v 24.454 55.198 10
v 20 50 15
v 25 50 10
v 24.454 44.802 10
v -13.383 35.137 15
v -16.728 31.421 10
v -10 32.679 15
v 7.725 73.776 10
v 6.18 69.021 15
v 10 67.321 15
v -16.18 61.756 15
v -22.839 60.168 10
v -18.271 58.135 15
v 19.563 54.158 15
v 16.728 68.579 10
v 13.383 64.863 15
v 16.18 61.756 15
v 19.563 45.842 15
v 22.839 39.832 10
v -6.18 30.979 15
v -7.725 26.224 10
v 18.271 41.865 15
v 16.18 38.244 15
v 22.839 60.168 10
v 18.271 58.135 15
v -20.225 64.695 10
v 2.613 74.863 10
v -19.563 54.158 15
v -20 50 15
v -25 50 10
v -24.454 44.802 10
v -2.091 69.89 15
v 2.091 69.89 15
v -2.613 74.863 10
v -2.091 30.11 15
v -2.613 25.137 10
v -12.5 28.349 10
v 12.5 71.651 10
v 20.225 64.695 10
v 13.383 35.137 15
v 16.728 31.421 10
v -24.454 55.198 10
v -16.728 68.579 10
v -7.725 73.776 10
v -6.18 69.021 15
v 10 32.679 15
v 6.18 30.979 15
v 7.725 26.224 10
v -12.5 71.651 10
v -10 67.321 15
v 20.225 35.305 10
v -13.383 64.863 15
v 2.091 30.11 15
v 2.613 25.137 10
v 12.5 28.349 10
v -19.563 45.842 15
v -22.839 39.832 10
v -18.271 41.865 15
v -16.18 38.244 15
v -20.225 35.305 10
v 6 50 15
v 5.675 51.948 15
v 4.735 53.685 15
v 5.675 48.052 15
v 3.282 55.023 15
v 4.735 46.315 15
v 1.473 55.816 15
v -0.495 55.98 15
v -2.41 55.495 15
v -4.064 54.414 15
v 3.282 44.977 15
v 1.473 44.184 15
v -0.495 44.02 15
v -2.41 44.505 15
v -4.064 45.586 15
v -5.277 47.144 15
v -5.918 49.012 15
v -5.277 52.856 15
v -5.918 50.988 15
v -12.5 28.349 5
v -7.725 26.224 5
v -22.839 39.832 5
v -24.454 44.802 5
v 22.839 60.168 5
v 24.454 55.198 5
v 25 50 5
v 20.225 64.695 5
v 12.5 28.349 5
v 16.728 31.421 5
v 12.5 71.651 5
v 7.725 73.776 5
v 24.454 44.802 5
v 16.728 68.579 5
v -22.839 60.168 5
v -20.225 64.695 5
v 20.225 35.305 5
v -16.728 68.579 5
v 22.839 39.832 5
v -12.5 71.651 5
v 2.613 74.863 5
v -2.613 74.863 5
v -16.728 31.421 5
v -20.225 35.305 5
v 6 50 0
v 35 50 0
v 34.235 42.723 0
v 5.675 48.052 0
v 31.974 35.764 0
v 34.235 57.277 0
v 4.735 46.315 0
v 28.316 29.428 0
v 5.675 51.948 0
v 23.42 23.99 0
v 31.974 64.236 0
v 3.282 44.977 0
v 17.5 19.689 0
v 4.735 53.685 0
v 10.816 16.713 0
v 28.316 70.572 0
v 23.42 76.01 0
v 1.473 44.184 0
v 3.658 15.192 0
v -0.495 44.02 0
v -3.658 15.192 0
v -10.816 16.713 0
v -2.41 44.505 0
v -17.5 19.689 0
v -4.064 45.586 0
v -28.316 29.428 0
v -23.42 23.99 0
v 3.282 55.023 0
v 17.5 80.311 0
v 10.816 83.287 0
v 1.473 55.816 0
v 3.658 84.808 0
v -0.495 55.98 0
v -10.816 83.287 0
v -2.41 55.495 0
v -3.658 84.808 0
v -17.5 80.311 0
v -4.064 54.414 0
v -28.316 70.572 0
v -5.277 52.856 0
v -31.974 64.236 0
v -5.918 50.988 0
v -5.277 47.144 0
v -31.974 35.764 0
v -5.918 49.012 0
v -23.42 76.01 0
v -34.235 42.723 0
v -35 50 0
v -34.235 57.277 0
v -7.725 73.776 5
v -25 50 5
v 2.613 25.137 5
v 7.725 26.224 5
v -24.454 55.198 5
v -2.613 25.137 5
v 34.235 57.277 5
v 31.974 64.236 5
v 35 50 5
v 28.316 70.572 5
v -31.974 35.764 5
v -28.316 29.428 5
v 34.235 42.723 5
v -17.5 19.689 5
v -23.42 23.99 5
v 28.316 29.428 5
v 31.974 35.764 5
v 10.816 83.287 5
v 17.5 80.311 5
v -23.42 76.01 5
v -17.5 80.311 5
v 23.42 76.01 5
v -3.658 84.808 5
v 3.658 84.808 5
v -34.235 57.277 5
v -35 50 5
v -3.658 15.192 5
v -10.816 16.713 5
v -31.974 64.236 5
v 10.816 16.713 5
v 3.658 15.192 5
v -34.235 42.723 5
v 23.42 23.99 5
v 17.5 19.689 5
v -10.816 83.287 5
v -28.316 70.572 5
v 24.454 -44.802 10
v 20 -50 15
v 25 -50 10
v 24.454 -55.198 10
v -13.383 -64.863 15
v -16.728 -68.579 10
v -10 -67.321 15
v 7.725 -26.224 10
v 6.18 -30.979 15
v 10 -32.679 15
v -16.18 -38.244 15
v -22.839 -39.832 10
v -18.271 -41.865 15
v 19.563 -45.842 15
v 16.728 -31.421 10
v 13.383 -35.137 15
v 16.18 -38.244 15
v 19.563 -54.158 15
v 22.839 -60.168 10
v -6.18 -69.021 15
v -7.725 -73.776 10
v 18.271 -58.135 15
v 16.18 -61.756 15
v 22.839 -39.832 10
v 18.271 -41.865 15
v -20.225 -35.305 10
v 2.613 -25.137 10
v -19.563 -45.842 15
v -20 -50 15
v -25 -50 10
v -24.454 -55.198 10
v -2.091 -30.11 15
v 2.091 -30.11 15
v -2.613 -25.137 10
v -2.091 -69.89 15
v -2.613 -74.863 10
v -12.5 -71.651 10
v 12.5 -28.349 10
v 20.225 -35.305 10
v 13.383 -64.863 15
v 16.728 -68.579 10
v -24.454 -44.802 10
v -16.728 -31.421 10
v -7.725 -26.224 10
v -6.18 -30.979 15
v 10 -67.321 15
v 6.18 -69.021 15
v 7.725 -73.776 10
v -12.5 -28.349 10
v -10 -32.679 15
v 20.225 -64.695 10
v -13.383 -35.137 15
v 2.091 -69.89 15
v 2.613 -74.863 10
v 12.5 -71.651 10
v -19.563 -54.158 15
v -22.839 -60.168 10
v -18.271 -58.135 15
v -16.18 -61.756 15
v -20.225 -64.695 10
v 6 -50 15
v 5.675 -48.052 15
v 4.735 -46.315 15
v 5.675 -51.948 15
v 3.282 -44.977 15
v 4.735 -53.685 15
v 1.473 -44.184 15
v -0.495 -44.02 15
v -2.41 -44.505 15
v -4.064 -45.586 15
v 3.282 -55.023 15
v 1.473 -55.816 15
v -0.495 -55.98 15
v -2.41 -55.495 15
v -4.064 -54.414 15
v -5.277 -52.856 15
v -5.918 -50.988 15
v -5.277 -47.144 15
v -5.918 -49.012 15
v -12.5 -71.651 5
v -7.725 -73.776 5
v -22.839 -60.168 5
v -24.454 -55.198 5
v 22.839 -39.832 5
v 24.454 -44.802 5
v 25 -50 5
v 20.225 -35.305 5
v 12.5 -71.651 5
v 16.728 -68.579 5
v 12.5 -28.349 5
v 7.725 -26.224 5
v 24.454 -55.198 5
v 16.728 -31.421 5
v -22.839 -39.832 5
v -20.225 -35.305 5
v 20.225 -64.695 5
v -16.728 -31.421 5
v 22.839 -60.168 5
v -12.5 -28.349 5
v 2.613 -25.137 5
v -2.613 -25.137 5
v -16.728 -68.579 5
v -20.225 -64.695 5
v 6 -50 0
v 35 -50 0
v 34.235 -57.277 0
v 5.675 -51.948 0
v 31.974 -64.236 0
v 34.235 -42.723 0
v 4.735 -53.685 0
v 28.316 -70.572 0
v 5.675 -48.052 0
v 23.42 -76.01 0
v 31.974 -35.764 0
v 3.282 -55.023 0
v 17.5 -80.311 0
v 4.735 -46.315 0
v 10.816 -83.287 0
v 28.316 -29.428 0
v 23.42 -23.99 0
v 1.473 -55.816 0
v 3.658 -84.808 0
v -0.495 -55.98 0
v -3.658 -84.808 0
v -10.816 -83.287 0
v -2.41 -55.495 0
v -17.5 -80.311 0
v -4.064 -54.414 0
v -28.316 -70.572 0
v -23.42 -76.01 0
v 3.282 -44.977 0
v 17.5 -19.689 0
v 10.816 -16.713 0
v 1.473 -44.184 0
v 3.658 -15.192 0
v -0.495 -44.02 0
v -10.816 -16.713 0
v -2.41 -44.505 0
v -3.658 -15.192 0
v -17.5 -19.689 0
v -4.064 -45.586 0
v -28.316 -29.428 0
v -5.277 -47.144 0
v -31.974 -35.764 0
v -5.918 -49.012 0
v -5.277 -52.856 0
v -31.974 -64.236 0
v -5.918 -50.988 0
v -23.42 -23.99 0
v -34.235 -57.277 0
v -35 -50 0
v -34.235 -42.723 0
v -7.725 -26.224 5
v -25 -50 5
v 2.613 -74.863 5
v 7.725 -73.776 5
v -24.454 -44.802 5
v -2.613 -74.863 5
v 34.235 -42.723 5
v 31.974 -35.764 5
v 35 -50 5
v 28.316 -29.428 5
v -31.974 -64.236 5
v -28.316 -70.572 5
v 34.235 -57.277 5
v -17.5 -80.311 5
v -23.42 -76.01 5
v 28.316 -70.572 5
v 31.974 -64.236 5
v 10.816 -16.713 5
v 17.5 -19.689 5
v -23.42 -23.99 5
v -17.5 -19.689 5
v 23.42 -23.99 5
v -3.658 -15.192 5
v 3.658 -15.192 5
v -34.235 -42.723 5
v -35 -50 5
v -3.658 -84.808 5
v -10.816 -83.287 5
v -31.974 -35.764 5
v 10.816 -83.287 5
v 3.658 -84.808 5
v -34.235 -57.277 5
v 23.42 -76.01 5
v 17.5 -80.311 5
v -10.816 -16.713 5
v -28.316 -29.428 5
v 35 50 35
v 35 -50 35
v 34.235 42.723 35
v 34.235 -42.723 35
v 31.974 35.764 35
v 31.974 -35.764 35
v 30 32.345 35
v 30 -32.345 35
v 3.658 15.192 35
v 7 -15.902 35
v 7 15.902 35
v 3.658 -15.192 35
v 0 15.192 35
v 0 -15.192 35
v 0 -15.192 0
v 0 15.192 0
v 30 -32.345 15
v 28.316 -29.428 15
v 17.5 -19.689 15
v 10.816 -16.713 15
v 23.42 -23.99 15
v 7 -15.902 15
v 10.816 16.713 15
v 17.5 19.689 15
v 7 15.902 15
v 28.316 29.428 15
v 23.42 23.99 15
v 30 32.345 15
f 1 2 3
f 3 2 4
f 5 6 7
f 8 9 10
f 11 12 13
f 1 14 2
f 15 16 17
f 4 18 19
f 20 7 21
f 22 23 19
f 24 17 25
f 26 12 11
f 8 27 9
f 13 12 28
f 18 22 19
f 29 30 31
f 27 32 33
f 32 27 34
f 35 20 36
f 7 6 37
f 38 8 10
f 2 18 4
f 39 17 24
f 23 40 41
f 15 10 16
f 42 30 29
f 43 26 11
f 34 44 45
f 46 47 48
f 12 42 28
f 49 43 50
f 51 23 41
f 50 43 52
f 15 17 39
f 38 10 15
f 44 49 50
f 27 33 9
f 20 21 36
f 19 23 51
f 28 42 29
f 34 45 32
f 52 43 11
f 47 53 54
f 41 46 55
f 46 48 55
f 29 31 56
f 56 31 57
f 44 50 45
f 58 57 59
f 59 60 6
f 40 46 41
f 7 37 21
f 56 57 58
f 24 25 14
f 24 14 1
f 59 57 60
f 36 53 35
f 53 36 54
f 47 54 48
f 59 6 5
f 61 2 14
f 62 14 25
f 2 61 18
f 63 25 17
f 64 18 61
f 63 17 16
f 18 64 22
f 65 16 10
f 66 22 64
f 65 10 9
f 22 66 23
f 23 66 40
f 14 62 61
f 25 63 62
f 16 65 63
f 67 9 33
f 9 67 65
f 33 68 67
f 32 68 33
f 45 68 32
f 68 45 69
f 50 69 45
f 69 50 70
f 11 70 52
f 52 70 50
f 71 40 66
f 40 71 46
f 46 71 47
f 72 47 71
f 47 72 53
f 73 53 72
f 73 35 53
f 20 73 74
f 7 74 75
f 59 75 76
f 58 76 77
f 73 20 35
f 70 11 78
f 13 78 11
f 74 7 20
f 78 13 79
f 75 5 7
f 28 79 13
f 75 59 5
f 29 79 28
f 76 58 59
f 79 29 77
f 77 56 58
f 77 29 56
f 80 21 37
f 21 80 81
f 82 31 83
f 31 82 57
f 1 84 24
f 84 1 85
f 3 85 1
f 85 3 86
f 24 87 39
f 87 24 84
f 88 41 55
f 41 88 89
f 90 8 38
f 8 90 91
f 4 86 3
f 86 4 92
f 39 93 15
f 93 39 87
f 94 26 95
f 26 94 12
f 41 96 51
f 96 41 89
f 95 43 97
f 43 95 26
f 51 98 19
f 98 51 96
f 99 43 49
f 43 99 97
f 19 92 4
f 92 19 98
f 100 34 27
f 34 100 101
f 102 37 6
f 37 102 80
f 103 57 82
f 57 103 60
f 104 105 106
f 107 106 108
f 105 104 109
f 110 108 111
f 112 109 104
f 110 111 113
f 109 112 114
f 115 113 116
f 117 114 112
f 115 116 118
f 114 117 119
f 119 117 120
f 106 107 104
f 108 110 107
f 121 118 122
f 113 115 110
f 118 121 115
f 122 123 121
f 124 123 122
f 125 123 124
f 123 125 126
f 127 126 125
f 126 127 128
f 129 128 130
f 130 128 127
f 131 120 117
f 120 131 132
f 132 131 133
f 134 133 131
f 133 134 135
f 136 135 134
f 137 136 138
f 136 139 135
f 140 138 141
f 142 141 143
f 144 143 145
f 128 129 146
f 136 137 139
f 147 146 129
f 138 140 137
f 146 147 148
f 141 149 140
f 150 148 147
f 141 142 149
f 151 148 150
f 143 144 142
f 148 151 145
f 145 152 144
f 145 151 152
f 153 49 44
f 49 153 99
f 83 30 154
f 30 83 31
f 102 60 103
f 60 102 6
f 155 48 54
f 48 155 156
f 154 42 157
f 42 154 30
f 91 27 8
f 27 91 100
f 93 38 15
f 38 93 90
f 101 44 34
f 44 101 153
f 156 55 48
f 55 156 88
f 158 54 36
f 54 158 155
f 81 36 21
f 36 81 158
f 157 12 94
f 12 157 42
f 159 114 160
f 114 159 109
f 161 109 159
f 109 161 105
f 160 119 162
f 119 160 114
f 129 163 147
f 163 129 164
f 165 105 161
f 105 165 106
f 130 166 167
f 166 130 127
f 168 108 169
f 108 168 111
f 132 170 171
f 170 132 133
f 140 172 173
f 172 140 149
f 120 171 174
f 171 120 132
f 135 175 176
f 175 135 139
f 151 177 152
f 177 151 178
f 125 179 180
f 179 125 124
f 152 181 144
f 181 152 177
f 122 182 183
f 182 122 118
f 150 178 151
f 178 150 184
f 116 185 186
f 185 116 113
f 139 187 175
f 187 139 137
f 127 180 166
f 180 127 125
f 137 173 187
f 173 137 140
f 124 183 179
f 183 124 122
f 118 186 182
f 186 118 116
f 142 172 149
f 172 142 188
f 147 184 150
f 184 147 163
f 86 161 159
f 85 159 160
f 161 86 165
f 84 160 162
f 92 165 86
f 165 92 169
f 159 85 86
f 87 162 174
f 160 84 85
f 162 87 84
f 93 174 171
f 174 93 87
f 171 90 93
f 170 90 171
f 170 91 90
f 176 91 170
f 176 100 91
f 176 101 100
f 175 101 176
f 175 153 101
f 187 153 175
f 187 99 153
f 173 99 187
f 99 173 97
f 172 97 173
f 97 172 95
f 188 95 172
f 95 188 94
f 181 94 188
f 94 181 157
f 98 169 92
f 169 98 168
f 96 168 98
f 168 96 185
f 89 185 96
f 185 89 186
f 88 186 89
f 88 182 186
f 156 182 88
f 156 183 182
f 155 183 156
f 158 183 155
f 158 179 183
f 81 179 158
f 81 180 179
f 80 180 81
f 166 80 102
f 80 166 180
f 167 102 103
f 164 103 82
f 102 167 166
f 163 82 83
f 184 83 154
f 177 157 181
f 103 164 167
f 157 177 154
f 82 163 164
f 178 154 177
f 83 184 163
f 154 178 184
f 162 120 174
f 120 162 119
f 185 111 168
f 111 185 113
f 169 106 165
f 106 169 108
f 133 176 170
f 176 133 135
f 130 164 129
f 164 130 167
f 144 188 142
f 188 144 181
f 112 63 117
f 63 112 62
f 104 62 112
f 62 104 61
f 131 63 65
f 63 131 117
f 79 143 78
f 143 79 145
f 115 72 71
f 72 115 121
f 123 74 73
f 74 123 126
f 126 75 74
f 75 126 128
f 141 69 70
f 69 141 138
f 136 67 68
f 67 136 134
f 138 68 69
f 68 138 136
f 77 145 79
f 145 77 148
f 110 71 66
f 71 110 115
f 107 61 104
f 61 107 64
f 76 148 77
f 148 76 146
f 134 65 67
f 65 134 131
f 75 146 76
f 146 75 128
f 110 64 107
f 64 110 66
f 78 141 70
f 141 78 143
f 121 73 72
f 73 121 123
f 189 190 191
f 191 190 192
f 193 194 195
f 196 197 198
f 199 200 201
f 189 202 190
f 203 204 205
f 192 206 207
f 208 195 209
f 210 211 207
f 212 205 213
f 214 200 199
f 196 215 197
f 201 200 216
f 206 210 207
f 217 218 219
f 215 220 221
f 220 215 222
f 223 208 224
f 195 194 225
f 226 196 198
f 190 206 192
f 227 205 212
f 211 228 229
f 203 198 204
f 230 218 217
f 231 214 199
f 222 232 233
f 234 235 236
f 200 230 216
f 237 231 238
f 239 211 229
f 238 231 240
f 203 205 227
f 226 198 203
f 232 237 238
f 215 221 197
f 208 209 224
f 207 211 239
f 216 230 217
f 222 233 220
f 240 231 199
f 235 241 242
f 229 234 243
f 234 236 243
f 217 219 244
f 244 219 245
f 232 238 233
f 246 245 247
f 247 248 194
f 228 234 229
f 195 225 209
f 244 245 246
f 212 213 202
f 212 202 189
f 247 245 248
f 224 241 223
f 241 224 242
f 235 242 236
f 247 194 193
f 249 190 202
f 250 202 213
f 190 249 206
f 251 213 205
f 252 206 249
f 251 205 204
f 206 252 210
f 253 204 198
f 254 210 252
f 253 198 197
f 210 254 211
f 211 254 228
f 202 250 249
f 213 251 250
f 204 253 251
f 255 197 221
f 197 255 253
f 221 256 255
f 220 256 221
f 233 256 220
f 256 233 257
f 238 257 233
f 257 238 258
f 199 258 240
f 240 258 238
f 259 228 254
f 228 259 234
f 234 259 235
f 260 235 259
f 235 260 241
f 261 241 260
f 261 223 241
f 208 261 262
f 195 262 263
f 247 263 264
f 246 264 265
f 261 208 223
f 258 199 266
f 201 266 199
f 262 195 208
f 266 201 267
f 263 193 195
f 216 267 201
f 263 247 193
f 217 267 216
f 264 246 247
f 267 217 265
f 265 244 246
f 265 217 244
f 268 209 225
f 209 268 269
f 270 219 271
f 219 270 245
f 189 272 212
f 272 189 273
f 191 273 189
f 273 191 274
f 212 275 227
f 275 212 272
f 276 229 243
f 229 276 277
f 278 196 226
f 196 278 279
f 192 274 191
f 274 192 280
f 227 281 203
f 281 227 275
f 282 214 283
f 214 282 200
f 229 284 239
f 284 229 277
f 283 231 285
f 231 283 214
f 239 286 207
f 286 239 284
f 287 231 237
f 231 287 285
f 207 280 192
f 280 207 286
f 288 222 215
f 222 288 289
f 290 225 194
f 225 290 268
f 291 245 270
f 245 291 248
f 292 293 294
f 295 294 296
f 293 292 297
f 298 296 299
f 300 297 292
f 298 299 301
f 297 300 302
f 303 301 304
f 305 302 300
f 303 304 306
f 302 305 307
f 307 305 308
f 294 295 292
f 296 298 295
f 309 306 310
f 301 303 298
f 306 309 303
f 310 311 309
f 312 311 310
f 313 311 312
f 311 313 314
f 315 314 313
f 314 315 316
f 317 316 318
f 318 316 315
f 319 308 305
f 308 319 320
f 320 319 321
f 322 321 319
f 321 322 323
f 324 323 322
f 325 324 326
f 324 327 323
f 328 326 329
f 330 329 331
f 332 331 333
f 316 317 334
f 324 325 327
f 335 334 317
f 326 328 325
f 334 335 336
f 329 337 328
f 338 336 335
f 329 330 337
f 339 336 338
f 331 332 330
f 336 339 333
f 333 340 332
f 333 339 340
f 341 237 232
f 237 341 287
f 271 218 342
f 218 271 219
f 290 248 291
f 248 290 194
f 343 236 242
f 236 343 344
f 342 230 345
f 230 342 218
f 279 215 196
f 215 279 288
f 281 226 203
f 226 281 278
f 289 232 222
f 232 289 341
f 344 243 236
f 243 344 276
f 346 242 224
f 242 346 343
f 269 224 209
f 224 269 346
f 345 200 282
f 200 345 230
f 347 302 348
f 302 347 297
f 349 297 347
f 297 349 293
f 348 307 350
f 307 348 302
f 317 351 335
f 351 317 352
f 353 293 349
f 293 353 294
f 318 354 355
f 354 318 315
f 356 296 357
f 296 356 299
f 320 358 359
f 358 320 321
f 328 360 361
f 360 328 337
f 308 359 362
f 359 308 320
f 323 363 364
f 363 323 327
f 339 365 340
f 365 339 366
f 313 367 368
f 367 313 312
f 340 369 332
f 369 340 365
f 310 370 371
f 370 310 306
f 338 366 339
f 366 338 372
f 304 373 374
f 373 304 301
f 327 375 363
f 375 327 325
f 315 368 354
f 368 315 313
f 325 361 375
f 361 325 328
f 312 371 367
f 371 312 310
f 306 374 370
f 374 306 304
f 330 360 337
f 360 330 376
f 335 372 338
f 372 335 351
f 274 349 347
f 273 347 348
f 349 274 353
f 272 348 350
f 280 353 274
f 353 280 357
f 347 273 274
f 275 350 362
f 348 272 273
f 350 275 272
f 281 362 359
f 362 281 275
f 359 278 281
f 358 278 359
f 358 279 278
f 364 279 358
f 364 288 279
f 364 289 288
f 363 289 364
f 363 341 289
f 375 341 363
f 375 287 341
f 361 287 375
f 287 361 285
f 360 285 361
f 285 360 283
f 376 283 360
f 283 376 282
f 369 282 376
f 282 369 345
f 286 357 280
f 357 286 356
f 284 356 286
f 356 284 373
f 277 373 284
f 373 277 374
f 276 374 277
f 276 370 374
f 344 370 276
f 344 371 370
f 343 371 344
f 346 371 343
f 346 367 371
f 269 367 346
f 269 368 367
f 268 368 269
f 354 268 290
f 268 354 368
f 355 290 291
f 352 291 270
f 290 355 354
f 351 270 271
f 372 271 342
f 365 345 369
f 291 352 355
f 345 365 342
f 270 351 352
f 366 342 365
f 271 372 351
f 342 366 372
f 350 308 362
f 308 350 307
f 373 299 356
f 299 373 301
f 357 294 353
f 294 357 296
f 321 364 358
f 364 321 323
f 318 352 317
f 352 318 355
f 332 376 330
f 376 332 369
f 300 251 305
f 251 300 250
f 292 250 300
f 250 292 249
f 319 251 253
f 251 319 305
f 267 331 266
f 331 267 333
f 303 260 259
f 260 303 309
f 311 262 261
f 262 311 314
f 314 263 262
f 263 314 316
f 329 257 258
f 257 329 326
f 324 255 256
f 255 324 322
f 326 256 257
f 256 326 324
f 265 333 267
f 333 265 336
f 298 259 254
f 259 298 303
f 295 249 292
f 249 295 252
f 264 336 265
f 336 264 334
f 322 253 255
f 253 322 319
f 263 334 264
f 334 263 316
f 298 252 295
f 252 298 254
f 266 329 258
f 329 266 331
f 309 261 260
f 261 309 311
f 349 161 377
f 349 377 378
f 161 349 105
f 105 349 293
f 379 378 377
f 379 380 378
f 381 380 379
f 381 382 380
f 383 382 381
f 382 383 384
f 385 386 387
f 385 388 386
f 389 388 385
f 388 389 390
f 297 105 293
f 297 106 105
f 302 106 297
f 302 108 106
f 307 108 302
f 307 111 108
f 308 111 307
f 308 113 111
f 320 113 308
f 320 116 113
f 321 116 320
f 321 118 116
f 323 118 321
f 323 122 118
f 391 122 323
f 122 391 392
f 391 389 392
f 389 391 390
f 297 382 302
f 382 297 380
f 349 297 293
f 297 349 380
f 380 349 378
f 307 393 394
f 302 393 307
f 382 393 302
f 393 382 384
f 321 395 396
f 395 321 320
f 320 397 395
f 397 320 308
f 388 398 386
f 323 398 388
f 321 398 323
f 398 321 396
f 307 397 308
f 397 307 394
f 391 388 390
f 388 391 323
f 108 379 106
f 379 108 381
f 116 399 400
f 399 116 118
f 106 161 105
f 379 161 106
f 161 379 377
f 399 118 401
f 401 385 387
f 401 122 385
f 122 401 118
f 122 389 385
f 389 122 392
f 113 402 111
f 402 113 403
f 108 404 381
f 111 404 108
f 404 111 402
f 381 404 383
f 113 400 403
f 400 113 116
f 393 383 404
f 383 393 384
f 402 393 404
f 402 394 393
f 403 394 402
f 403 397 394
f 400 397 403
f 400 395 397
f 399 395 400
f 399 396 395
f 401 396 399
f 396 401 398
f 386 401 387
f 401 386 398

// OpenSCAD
union() {
	translate([0, 50, 0]) {
		difference() {
			union() {
				translate([0, 0, 10])
					cylinder(h=5, r2=20, r1=25);
			
				cylinder(h=10, r=25);
			
				cylinder(h=5, r=35);
			}
		
			cylinder(h=15, r=6);
		}
	}
	
	translate([0, -50, 0]) {
		difference() {
			union() {
				translate([0, 0, 10])
					cylinder(h=5, r2=20, r1=25);
			
				cylinder(h=10, r=25);
			
				cylinder(h=5, r=35);
			}
		
			cylinder(h=15, r=6);
		}
	}

	difference() {
		translate([0, -50, 0])
			cube([35, 100, 35]);

		translate([0, -50, 0]) {
			cylinder(h=35, r=35);
		}

		translate([0, 50, 0]) {
			cylinder(h=35, r=35);
		}

		translate([7, -50, 15])
			cube([23, 100, 20]);
	}
}
